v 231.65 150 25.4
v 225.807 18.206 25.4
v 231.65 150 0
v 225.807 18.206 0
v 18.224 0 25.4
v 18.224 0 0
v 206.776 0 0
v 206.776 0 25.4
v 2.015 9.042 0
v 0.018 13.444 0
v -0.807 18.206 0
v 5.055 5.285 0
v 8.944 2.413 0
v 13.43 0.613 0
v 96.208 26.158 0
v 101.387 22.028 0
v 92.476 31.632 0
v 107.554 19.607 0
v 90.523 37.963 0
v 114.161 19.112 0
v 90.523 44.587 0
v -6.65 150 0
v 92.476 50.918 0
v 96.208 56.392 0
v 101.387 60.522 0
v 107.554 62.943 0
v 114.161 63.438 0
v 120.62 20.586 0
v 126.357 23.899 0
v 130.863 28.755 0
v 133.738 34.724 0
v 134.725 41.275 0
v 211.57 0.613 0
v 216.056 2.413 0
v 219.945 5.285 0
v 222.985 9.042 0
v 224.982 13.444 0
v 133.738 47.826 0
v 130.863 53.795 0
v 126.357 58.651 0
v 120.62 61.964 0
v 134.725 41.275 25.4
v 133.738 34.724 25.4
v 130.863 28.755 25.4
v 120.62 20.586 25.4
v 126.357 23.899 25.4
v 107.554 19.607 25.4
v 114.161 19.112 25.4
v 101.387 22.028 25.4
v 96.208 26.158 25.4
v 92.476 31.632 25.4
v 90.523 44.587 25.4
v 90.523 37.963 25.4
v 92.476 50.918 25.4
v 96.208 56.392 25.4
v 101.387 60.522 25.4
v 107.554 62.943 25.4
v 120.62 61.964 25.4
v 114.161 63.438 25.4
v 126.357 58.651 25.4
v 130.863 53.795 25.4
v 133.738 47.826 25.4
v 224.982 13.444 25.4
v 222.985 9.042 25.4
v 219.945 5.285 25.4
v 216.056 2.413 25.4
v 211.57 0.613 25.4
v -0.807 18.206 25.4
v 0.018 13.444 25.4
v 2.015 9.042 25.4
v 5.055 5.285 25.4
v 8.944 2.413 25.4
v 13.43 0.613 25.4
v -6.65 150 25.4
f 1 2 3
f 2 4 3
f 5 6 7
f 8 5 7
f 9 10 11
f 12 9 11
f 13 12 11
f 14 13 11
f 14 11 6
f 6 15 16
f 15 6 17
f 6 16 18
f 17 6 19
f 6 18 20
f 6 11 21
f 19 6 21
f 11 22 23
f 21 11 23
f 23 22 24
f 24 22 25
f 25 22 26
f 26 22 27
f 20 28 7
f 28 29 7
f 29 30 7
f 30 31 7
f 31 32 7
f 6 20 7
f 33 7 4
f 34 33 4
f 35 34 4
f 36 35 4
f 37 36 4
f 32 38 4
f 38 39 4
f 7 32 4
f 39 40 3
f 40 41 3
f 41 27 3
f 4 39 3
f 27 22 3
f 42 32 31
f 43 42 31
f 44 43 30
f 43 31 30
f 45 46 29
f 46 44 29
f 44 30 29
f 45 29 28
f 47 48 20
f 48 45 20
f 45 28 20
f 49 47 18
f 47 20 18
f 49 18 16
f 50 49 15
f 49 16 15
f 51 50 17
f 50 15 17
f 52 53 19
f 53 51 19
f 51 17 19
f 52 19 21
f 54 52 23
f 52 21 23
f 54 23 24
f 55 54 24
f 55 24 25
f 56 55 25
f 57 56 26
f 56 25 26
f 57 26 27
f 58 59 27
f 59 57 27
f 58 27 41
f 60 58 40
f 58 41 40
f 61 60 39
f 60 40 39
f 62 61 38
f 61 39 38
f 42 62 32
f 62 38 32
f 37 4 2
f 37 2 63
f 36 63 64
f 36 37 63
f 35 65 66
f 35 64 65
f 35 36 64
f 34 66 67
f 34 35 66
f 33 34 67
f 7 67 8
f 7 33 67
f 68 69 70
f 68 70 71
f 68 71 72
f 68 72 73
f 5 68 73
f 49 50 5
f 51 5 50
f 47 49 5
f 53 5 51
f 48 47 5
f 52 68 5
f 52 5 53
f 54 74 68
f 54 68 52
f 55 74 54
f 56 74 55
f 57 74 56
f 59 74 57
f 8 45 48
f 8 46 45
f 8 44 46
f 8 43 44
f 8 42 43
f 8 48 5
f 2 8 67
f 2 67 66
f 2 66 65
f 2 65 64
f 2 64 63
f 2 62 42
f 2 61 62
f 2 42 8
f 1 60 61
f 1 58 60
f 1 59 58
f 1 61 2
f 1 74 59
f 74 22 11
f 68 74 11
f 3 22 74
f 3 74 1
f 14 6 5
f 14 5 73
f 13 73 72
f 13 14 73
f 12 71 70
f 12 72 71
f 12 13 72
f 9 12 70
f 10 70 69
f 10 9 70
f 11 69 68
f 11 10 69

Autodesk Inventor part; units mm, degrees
ref_plane "YZ Plane" through (0, 0, 0) normal (1, 0, 0) x (0, 1, 0)
ref_plane "XZ Plane" through (0, 0, 0) normal (0, 1, 0) x (-1, 0, 0)
ref_plane "XY Plane" through (0, 0, 0) normal (0, 0, 1) x (1, 0, 0)
sketch "Sketch1" plane through (0, 0, 0) normal (0, 0, 1) x (1, 0, 0)
  line L0 (18.2242, 0) -> (206.7758, 0)
  line L1 (-6.65, 150) -> (231.65, 150)
  line L2 (-6.65, 150) -> (-0.8071, 18.2063)
  line L3 (225.8071, 18.2063) -> (231.65, 150)
  arc A0 (-0.8071, 18.2063) -> (18.2242, 0) centre (18.2242, 19.05) ccw
  arc A1 (206.7758, 0) -> (225.8071, 18.2063) centre (206.7758, 19.05) ccw
  circle A2 centre (112.5, 41.275) radius 22.225
  point P0 (0, 0)
  point P1 (225, 0)
  point P2 (112.5, 0)
  point P3 (112.5, 150)
  dimension "d0" = 225
  dimension "d1" = 150
  dimension "d2" = 238.3
  dimension "d4" = 19.05
  dimension "d11" = 0
  dimension "d12" = 44.45
  dimension "d13" = 41.275
extrude "Extrusion1" add sketch "Sketch1" along normal blind 25.4
sketch "Sketch2" plane through (0, 0, 25.4) normal (0, 0, 1) x (1, 0, 0)
  line L0 (243.0343, 163.5066) -> (27.3006, 163.5066)
  line L1 (27.3006, 163.5066) -> (27.3006, 18.9917)
  line L2 (27.3006, 18.9917) -> (243.0343, 18.9917)
  line L3 (243.0343, 18.9917) -> (243.0343, 163.5066)
  line L4 (27.1522, 18.9917) -> (243.0343, 18.9917)
  line L5 (243.0343, 18.9917) -> (243.0343, -17.0628)
  line L6 (243.0343, -17.0628) -> (27.1522, -17.0628)
  line L7 (27.1522, -17.0628) -> (27.1522, 18.9917)
  point P0 (0, 0)
extrude "Test" [suppressed]
properties part number "Divider_3DPrint"
